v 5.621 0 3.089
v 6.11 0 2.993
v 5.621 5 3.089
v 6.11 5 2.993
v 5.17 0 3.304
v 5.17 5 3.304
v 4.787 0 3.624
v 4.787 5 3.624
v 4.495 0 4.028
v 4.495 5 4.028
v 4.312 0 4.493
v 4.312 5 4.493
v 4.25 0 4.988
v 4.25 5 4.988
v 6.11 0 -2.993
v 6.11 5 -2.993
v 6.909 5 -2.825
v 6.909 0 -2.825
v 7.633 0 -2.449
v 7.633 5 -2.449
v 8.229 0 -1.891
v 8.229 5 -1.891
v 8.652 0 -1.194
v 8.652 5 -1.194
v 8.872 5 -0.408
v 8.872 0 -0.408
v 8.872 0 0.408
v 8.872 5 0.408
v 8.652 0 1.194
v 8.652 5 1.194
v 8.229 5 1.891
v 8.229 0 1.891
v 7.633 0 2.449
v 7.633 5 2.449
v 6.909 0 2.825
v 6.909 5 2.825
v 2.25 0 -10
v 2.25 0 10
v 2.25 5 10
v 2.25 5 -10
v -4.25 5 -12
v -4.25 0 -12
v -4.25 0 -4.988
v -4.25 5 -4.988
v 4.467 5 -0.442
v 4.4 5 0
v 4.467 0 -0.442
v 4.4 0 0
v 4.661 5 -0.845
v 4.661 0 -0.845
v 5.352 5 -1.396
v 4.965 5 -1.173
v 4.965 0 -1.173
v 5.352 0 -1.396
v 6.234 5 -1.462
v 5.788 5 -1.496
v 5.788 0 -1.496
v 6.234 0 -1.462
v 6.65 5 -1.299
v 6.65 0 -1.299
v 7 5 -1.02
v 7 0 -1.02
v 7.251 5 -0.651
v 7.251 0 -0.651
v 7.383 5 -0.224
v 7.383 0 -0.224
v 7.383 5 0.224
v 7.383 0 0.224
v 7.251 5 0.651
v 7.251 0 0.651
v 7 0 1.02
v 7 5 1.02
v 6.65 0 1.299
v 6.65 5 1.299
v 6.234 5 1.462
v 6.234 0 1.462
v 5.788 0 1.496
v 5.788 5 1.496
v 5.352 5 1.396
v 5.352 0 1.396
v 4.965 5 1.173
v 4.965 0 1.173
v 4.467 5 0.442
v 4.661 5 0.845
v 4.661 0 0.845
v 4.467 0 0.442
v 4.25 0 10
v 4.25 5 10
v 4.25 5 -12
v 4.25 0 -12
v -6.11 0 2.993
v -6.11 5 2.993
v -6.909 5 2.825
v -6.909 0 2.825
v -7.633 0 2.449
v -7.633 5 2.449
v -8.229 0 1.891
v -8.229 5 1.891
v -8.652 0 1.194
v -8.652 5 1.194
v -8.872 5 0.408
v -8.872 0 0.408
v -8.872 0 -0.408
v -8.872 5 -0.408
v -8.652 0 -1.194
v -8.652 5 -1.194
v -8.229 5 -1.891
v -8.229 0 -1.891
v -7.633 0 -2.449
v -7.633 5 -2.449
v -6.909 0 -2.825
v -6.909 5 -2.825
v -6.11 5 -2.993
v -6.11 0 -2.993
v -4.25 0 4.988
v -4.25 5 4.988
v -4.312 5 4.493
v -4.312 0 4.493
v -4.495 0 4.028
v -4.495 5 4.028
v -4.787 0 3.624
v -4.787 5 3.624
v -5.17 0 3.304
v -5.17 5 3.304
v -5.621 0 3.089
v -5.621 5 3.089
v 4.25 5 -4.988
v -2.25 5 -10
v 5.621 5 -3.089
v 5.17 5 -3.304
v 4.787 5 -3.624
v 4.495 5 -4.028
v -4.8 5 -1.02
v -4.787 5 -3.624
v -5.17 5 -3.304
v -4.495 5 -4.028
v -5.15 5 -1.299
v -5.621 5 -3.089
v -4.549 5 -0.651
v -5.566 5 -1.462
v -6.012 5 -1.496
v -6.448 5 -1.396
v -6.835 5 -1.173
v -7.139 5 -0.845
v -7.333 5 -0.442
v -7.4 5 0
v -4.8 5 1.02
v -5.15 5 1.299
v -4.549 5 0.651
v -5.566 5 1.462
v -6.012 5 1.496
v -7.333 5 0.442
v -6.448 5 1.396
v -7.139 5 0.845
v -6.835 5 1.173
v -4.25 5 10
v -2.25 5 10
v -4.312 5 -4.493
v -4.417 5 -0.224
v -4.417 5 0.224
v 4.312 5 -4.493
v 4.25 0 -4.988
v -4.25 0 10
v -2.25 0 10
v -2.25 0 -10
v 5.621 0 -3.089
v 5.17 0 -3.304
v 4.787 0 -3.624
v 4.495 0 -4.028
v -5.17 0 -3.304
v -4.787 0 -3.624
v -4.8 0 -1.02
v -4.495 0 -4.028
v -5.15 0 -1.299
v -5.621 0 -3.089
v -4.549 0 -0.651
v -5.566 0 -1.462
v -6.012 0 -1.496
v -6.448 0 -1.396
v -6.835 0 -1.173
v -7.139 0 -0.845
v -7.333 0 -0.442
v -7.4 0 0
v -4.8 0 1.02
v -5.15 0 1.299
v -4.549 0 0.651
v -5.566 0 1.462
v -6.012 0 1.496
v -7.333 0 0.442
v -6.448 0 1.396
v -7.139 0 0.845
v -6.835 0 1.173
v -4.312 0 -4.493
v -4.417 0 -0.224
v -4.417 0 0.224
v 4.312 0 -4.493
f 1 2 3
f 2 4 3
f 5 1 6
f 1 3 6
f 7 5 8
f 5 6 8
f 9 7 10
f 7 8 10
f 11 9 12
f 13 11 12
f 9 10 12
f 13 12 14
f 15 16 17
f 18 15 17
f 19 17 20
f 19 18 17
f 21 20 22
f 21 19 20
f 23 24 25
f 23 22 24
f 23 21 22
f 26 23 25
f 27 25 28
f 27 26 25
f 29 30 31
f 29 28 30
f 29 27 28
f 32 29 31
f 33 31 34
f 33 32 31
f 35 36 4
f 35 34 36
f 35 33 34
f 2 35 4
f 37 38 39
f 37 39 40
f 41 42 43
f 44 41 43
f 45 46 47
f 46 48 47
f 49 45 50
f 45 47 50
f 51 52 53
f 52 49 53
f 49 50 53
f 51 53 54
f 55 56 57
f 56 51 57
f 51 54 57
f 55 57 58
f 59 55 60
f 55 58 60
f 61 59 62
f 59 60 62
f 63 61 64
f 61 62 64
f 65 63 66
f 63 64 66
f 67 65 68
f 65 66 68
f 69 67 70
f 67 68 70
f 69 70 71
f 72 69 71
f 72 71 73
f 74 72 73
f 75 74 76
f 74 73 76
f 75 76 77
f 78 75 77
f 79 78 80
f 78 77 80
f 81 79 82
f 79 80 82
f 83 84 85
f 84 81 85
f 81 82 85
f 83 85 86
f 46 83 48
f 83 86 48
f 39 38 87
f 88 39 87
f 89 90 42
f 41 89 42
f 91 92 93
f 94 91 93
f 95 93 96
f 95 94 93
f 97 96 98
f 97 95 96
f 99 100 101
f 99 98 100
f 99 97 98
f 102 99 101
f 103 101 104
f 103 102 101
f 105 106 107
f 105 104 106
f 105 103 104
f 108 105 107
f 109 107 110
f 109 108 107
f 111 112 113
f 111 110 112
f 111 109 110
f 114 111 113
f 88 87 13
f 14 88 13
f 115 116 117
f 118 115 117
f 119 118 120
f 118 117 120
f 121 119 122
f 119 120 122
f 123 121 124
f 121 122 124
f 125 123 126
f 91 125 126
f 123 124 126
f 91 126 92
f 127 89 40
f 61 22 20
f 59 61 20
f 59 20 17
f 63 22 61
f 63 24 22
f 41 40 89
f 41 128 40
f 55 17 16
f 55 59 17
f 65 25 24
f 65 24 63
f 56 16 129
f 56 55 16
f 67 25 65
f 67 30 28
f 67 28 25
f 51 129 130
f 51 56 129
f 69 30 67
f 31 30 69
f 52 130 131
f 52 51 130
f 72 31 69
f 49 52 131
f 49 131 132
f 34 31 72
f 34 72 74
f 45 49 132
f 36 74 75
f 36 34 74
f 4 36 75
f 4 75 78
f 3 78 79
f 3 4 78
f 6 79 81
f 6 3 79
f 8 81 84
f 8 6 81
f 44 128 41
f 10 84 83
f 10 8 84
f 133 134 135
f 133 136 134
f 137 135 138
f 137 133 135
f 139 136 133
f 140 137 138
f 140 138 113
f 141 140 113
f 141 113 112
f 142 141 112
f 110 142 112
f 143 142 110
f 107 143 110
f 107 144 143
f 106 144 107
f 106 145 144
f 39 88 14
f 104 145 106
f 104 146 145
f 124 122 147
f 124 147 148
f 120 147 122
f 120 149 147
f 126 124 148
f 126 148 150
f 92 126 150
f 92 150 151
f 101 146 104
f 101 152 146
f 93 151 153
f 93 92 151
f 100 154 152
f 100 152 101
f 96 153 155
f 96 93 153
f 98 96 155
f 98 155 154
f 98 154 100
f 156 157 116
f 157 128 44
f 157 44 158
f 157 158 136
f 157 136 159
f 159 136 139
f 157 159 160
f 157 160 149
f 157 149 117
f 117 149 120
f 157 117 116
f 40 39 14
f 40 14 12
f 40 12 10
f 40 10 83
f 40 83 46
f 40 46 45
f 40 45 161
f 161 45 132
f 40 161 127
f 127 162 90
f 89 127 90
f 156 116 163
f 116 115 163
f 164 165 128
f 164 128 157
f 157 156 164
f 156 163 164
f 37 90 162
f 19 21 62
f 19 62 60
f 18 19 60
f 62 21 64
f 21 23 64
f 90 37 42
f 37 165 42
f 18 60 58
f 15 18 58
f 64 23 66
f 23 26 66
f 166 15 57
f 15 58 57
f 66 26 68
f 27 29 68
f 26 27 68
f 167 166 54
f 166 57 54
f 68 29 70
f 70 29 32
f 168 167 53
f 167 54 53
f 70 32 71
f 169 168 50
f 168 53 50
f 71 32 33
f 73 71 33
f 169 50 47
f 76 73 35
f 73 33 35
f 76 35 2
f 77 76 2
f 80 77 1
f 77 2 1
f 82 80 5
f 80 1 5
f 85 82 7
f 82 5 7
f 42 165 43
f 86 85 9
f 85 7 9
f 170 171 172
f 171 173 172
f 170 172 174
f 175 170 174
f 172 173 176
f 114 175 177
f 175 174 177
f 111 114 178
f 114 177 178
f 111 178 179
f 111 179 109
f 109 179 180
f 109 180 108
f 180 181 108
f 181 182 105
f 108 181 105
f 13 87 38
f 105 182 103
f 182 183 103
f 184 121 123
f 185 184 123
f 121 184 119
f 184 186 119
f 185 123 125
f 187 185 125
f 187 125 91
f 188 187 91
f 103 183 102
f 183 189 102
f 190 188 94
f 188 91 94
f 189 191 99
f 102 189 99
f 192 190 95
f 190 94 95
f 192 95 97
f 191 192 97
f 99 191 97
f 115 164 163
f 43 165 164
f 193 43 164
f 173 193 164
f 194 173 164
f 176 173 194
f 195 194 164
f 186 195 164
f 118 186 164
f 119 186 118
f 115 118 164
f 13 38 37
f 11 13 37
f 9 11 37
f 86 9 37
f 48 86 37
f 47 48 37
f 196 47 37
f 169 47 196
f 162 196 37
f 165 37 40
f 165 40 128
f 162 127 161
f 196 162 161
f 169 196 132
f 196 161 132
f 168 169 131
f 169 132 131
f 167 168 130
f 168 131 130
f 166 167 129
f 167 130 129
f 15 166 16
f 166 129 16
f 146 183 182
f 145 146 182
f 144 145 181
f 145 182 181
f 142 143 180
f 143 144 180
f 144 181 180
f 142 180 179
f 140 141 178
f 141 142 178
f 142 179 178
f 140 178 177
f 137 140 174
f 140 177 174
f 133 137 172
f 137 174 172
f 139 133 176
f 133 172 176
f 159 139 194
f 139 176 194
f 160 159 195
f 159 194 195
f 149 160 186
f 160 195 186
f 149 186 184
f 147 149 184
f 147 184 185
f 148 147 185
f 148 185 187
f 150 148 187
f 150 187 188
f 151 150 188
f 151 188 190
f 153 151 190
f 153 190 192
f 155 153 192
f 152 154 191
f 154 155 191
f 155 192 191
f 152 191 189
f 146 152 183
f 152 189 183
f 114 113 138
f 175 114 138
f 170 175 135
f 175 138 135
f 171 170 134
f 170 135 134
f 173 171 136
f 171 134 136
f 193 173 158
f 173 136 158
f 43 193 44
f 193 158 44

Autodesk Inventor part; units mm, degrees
ref_plane "YZ Plane" through (0, 0, 0) normal (1, 0, 0) x (0, 1, 0)
ref_plane "XZ Plane" through (0, 0, 0) normal (0, 1, 0) x (-1, 0, 0)
ref_plane "XY Plane" through (0, 0, 0) normal (0, 0, 1) x (1, 0, 0)
sketch "Sketch1" plane through (0, 0, 0) normal (0, 1, 0) x (-1, 0, 0)
  line L0 (2.25, 10) -> (-2.25, 10)
  line L1 (-2.25, 10) -> (-2.25, -10)
  line L2 (-2.25, -10) -> (2.25, -10)
  line L3 (2.25, -10) -> (2.25, 10)
  line L4 (4.25, 10) -> (-4.25, 10)
  line L5 (-4.25, -12) -> (4.25, -12)
  circle A0 centre (5.9, 0) radius 1.5
  circle A1 centre (-5.9, 0) radius 1.5
  arc A2 (-4.25, 2.5055) -> (-4.25, -2.5055) centre (-5.9, 0) ccw
  arc A3 (4.25, -2.5055) -> (4.25, 2.5055) centre (5.9, 0) ccw
  line L6 (4.25, -12) -> (4.25, -2.5055)
  line L7 (4.25, 2.5055) -> (4.25, 10)
  line L8 (-4.25, 10) -> (-4.25, 2.5055)
  line L9 (-4.25, -2.5055) -> (-4.25, -12)
  point P0 (0, 0)
  point P1 (0, -12)
  point P2 (0, -10)
  point P3 (2.25, 0)
  dimension "d0" = 4.5
  dimension "d1" = 20
  dimension "d2" = 5.9
  dimension "d3" = 11.8
  dimension "d4" = 3
  dimension "d5" = 3
  dimension "d6" = 6
  dimension "d7" = 6
  dimension "d8" = 2
  dimension "d9" = 2
  dimension "d10" = 2
  dimension "d11" = 2
extrude "Extrusion1" add sketch "Sketch1" along normal blind 5 contours L4 L7 A3 L6 L5 L9 A2 L8 L1 L2 L3
fillet "Fillet1" radius 2 4 edges at (4.25, 2.5, 2.5055) (-4.25, 2.5, 2.5055) (-4.25, 2.5, -2.5055) (4.25, 2.5, -2.5055)
properties part number "Stand Clamp"
